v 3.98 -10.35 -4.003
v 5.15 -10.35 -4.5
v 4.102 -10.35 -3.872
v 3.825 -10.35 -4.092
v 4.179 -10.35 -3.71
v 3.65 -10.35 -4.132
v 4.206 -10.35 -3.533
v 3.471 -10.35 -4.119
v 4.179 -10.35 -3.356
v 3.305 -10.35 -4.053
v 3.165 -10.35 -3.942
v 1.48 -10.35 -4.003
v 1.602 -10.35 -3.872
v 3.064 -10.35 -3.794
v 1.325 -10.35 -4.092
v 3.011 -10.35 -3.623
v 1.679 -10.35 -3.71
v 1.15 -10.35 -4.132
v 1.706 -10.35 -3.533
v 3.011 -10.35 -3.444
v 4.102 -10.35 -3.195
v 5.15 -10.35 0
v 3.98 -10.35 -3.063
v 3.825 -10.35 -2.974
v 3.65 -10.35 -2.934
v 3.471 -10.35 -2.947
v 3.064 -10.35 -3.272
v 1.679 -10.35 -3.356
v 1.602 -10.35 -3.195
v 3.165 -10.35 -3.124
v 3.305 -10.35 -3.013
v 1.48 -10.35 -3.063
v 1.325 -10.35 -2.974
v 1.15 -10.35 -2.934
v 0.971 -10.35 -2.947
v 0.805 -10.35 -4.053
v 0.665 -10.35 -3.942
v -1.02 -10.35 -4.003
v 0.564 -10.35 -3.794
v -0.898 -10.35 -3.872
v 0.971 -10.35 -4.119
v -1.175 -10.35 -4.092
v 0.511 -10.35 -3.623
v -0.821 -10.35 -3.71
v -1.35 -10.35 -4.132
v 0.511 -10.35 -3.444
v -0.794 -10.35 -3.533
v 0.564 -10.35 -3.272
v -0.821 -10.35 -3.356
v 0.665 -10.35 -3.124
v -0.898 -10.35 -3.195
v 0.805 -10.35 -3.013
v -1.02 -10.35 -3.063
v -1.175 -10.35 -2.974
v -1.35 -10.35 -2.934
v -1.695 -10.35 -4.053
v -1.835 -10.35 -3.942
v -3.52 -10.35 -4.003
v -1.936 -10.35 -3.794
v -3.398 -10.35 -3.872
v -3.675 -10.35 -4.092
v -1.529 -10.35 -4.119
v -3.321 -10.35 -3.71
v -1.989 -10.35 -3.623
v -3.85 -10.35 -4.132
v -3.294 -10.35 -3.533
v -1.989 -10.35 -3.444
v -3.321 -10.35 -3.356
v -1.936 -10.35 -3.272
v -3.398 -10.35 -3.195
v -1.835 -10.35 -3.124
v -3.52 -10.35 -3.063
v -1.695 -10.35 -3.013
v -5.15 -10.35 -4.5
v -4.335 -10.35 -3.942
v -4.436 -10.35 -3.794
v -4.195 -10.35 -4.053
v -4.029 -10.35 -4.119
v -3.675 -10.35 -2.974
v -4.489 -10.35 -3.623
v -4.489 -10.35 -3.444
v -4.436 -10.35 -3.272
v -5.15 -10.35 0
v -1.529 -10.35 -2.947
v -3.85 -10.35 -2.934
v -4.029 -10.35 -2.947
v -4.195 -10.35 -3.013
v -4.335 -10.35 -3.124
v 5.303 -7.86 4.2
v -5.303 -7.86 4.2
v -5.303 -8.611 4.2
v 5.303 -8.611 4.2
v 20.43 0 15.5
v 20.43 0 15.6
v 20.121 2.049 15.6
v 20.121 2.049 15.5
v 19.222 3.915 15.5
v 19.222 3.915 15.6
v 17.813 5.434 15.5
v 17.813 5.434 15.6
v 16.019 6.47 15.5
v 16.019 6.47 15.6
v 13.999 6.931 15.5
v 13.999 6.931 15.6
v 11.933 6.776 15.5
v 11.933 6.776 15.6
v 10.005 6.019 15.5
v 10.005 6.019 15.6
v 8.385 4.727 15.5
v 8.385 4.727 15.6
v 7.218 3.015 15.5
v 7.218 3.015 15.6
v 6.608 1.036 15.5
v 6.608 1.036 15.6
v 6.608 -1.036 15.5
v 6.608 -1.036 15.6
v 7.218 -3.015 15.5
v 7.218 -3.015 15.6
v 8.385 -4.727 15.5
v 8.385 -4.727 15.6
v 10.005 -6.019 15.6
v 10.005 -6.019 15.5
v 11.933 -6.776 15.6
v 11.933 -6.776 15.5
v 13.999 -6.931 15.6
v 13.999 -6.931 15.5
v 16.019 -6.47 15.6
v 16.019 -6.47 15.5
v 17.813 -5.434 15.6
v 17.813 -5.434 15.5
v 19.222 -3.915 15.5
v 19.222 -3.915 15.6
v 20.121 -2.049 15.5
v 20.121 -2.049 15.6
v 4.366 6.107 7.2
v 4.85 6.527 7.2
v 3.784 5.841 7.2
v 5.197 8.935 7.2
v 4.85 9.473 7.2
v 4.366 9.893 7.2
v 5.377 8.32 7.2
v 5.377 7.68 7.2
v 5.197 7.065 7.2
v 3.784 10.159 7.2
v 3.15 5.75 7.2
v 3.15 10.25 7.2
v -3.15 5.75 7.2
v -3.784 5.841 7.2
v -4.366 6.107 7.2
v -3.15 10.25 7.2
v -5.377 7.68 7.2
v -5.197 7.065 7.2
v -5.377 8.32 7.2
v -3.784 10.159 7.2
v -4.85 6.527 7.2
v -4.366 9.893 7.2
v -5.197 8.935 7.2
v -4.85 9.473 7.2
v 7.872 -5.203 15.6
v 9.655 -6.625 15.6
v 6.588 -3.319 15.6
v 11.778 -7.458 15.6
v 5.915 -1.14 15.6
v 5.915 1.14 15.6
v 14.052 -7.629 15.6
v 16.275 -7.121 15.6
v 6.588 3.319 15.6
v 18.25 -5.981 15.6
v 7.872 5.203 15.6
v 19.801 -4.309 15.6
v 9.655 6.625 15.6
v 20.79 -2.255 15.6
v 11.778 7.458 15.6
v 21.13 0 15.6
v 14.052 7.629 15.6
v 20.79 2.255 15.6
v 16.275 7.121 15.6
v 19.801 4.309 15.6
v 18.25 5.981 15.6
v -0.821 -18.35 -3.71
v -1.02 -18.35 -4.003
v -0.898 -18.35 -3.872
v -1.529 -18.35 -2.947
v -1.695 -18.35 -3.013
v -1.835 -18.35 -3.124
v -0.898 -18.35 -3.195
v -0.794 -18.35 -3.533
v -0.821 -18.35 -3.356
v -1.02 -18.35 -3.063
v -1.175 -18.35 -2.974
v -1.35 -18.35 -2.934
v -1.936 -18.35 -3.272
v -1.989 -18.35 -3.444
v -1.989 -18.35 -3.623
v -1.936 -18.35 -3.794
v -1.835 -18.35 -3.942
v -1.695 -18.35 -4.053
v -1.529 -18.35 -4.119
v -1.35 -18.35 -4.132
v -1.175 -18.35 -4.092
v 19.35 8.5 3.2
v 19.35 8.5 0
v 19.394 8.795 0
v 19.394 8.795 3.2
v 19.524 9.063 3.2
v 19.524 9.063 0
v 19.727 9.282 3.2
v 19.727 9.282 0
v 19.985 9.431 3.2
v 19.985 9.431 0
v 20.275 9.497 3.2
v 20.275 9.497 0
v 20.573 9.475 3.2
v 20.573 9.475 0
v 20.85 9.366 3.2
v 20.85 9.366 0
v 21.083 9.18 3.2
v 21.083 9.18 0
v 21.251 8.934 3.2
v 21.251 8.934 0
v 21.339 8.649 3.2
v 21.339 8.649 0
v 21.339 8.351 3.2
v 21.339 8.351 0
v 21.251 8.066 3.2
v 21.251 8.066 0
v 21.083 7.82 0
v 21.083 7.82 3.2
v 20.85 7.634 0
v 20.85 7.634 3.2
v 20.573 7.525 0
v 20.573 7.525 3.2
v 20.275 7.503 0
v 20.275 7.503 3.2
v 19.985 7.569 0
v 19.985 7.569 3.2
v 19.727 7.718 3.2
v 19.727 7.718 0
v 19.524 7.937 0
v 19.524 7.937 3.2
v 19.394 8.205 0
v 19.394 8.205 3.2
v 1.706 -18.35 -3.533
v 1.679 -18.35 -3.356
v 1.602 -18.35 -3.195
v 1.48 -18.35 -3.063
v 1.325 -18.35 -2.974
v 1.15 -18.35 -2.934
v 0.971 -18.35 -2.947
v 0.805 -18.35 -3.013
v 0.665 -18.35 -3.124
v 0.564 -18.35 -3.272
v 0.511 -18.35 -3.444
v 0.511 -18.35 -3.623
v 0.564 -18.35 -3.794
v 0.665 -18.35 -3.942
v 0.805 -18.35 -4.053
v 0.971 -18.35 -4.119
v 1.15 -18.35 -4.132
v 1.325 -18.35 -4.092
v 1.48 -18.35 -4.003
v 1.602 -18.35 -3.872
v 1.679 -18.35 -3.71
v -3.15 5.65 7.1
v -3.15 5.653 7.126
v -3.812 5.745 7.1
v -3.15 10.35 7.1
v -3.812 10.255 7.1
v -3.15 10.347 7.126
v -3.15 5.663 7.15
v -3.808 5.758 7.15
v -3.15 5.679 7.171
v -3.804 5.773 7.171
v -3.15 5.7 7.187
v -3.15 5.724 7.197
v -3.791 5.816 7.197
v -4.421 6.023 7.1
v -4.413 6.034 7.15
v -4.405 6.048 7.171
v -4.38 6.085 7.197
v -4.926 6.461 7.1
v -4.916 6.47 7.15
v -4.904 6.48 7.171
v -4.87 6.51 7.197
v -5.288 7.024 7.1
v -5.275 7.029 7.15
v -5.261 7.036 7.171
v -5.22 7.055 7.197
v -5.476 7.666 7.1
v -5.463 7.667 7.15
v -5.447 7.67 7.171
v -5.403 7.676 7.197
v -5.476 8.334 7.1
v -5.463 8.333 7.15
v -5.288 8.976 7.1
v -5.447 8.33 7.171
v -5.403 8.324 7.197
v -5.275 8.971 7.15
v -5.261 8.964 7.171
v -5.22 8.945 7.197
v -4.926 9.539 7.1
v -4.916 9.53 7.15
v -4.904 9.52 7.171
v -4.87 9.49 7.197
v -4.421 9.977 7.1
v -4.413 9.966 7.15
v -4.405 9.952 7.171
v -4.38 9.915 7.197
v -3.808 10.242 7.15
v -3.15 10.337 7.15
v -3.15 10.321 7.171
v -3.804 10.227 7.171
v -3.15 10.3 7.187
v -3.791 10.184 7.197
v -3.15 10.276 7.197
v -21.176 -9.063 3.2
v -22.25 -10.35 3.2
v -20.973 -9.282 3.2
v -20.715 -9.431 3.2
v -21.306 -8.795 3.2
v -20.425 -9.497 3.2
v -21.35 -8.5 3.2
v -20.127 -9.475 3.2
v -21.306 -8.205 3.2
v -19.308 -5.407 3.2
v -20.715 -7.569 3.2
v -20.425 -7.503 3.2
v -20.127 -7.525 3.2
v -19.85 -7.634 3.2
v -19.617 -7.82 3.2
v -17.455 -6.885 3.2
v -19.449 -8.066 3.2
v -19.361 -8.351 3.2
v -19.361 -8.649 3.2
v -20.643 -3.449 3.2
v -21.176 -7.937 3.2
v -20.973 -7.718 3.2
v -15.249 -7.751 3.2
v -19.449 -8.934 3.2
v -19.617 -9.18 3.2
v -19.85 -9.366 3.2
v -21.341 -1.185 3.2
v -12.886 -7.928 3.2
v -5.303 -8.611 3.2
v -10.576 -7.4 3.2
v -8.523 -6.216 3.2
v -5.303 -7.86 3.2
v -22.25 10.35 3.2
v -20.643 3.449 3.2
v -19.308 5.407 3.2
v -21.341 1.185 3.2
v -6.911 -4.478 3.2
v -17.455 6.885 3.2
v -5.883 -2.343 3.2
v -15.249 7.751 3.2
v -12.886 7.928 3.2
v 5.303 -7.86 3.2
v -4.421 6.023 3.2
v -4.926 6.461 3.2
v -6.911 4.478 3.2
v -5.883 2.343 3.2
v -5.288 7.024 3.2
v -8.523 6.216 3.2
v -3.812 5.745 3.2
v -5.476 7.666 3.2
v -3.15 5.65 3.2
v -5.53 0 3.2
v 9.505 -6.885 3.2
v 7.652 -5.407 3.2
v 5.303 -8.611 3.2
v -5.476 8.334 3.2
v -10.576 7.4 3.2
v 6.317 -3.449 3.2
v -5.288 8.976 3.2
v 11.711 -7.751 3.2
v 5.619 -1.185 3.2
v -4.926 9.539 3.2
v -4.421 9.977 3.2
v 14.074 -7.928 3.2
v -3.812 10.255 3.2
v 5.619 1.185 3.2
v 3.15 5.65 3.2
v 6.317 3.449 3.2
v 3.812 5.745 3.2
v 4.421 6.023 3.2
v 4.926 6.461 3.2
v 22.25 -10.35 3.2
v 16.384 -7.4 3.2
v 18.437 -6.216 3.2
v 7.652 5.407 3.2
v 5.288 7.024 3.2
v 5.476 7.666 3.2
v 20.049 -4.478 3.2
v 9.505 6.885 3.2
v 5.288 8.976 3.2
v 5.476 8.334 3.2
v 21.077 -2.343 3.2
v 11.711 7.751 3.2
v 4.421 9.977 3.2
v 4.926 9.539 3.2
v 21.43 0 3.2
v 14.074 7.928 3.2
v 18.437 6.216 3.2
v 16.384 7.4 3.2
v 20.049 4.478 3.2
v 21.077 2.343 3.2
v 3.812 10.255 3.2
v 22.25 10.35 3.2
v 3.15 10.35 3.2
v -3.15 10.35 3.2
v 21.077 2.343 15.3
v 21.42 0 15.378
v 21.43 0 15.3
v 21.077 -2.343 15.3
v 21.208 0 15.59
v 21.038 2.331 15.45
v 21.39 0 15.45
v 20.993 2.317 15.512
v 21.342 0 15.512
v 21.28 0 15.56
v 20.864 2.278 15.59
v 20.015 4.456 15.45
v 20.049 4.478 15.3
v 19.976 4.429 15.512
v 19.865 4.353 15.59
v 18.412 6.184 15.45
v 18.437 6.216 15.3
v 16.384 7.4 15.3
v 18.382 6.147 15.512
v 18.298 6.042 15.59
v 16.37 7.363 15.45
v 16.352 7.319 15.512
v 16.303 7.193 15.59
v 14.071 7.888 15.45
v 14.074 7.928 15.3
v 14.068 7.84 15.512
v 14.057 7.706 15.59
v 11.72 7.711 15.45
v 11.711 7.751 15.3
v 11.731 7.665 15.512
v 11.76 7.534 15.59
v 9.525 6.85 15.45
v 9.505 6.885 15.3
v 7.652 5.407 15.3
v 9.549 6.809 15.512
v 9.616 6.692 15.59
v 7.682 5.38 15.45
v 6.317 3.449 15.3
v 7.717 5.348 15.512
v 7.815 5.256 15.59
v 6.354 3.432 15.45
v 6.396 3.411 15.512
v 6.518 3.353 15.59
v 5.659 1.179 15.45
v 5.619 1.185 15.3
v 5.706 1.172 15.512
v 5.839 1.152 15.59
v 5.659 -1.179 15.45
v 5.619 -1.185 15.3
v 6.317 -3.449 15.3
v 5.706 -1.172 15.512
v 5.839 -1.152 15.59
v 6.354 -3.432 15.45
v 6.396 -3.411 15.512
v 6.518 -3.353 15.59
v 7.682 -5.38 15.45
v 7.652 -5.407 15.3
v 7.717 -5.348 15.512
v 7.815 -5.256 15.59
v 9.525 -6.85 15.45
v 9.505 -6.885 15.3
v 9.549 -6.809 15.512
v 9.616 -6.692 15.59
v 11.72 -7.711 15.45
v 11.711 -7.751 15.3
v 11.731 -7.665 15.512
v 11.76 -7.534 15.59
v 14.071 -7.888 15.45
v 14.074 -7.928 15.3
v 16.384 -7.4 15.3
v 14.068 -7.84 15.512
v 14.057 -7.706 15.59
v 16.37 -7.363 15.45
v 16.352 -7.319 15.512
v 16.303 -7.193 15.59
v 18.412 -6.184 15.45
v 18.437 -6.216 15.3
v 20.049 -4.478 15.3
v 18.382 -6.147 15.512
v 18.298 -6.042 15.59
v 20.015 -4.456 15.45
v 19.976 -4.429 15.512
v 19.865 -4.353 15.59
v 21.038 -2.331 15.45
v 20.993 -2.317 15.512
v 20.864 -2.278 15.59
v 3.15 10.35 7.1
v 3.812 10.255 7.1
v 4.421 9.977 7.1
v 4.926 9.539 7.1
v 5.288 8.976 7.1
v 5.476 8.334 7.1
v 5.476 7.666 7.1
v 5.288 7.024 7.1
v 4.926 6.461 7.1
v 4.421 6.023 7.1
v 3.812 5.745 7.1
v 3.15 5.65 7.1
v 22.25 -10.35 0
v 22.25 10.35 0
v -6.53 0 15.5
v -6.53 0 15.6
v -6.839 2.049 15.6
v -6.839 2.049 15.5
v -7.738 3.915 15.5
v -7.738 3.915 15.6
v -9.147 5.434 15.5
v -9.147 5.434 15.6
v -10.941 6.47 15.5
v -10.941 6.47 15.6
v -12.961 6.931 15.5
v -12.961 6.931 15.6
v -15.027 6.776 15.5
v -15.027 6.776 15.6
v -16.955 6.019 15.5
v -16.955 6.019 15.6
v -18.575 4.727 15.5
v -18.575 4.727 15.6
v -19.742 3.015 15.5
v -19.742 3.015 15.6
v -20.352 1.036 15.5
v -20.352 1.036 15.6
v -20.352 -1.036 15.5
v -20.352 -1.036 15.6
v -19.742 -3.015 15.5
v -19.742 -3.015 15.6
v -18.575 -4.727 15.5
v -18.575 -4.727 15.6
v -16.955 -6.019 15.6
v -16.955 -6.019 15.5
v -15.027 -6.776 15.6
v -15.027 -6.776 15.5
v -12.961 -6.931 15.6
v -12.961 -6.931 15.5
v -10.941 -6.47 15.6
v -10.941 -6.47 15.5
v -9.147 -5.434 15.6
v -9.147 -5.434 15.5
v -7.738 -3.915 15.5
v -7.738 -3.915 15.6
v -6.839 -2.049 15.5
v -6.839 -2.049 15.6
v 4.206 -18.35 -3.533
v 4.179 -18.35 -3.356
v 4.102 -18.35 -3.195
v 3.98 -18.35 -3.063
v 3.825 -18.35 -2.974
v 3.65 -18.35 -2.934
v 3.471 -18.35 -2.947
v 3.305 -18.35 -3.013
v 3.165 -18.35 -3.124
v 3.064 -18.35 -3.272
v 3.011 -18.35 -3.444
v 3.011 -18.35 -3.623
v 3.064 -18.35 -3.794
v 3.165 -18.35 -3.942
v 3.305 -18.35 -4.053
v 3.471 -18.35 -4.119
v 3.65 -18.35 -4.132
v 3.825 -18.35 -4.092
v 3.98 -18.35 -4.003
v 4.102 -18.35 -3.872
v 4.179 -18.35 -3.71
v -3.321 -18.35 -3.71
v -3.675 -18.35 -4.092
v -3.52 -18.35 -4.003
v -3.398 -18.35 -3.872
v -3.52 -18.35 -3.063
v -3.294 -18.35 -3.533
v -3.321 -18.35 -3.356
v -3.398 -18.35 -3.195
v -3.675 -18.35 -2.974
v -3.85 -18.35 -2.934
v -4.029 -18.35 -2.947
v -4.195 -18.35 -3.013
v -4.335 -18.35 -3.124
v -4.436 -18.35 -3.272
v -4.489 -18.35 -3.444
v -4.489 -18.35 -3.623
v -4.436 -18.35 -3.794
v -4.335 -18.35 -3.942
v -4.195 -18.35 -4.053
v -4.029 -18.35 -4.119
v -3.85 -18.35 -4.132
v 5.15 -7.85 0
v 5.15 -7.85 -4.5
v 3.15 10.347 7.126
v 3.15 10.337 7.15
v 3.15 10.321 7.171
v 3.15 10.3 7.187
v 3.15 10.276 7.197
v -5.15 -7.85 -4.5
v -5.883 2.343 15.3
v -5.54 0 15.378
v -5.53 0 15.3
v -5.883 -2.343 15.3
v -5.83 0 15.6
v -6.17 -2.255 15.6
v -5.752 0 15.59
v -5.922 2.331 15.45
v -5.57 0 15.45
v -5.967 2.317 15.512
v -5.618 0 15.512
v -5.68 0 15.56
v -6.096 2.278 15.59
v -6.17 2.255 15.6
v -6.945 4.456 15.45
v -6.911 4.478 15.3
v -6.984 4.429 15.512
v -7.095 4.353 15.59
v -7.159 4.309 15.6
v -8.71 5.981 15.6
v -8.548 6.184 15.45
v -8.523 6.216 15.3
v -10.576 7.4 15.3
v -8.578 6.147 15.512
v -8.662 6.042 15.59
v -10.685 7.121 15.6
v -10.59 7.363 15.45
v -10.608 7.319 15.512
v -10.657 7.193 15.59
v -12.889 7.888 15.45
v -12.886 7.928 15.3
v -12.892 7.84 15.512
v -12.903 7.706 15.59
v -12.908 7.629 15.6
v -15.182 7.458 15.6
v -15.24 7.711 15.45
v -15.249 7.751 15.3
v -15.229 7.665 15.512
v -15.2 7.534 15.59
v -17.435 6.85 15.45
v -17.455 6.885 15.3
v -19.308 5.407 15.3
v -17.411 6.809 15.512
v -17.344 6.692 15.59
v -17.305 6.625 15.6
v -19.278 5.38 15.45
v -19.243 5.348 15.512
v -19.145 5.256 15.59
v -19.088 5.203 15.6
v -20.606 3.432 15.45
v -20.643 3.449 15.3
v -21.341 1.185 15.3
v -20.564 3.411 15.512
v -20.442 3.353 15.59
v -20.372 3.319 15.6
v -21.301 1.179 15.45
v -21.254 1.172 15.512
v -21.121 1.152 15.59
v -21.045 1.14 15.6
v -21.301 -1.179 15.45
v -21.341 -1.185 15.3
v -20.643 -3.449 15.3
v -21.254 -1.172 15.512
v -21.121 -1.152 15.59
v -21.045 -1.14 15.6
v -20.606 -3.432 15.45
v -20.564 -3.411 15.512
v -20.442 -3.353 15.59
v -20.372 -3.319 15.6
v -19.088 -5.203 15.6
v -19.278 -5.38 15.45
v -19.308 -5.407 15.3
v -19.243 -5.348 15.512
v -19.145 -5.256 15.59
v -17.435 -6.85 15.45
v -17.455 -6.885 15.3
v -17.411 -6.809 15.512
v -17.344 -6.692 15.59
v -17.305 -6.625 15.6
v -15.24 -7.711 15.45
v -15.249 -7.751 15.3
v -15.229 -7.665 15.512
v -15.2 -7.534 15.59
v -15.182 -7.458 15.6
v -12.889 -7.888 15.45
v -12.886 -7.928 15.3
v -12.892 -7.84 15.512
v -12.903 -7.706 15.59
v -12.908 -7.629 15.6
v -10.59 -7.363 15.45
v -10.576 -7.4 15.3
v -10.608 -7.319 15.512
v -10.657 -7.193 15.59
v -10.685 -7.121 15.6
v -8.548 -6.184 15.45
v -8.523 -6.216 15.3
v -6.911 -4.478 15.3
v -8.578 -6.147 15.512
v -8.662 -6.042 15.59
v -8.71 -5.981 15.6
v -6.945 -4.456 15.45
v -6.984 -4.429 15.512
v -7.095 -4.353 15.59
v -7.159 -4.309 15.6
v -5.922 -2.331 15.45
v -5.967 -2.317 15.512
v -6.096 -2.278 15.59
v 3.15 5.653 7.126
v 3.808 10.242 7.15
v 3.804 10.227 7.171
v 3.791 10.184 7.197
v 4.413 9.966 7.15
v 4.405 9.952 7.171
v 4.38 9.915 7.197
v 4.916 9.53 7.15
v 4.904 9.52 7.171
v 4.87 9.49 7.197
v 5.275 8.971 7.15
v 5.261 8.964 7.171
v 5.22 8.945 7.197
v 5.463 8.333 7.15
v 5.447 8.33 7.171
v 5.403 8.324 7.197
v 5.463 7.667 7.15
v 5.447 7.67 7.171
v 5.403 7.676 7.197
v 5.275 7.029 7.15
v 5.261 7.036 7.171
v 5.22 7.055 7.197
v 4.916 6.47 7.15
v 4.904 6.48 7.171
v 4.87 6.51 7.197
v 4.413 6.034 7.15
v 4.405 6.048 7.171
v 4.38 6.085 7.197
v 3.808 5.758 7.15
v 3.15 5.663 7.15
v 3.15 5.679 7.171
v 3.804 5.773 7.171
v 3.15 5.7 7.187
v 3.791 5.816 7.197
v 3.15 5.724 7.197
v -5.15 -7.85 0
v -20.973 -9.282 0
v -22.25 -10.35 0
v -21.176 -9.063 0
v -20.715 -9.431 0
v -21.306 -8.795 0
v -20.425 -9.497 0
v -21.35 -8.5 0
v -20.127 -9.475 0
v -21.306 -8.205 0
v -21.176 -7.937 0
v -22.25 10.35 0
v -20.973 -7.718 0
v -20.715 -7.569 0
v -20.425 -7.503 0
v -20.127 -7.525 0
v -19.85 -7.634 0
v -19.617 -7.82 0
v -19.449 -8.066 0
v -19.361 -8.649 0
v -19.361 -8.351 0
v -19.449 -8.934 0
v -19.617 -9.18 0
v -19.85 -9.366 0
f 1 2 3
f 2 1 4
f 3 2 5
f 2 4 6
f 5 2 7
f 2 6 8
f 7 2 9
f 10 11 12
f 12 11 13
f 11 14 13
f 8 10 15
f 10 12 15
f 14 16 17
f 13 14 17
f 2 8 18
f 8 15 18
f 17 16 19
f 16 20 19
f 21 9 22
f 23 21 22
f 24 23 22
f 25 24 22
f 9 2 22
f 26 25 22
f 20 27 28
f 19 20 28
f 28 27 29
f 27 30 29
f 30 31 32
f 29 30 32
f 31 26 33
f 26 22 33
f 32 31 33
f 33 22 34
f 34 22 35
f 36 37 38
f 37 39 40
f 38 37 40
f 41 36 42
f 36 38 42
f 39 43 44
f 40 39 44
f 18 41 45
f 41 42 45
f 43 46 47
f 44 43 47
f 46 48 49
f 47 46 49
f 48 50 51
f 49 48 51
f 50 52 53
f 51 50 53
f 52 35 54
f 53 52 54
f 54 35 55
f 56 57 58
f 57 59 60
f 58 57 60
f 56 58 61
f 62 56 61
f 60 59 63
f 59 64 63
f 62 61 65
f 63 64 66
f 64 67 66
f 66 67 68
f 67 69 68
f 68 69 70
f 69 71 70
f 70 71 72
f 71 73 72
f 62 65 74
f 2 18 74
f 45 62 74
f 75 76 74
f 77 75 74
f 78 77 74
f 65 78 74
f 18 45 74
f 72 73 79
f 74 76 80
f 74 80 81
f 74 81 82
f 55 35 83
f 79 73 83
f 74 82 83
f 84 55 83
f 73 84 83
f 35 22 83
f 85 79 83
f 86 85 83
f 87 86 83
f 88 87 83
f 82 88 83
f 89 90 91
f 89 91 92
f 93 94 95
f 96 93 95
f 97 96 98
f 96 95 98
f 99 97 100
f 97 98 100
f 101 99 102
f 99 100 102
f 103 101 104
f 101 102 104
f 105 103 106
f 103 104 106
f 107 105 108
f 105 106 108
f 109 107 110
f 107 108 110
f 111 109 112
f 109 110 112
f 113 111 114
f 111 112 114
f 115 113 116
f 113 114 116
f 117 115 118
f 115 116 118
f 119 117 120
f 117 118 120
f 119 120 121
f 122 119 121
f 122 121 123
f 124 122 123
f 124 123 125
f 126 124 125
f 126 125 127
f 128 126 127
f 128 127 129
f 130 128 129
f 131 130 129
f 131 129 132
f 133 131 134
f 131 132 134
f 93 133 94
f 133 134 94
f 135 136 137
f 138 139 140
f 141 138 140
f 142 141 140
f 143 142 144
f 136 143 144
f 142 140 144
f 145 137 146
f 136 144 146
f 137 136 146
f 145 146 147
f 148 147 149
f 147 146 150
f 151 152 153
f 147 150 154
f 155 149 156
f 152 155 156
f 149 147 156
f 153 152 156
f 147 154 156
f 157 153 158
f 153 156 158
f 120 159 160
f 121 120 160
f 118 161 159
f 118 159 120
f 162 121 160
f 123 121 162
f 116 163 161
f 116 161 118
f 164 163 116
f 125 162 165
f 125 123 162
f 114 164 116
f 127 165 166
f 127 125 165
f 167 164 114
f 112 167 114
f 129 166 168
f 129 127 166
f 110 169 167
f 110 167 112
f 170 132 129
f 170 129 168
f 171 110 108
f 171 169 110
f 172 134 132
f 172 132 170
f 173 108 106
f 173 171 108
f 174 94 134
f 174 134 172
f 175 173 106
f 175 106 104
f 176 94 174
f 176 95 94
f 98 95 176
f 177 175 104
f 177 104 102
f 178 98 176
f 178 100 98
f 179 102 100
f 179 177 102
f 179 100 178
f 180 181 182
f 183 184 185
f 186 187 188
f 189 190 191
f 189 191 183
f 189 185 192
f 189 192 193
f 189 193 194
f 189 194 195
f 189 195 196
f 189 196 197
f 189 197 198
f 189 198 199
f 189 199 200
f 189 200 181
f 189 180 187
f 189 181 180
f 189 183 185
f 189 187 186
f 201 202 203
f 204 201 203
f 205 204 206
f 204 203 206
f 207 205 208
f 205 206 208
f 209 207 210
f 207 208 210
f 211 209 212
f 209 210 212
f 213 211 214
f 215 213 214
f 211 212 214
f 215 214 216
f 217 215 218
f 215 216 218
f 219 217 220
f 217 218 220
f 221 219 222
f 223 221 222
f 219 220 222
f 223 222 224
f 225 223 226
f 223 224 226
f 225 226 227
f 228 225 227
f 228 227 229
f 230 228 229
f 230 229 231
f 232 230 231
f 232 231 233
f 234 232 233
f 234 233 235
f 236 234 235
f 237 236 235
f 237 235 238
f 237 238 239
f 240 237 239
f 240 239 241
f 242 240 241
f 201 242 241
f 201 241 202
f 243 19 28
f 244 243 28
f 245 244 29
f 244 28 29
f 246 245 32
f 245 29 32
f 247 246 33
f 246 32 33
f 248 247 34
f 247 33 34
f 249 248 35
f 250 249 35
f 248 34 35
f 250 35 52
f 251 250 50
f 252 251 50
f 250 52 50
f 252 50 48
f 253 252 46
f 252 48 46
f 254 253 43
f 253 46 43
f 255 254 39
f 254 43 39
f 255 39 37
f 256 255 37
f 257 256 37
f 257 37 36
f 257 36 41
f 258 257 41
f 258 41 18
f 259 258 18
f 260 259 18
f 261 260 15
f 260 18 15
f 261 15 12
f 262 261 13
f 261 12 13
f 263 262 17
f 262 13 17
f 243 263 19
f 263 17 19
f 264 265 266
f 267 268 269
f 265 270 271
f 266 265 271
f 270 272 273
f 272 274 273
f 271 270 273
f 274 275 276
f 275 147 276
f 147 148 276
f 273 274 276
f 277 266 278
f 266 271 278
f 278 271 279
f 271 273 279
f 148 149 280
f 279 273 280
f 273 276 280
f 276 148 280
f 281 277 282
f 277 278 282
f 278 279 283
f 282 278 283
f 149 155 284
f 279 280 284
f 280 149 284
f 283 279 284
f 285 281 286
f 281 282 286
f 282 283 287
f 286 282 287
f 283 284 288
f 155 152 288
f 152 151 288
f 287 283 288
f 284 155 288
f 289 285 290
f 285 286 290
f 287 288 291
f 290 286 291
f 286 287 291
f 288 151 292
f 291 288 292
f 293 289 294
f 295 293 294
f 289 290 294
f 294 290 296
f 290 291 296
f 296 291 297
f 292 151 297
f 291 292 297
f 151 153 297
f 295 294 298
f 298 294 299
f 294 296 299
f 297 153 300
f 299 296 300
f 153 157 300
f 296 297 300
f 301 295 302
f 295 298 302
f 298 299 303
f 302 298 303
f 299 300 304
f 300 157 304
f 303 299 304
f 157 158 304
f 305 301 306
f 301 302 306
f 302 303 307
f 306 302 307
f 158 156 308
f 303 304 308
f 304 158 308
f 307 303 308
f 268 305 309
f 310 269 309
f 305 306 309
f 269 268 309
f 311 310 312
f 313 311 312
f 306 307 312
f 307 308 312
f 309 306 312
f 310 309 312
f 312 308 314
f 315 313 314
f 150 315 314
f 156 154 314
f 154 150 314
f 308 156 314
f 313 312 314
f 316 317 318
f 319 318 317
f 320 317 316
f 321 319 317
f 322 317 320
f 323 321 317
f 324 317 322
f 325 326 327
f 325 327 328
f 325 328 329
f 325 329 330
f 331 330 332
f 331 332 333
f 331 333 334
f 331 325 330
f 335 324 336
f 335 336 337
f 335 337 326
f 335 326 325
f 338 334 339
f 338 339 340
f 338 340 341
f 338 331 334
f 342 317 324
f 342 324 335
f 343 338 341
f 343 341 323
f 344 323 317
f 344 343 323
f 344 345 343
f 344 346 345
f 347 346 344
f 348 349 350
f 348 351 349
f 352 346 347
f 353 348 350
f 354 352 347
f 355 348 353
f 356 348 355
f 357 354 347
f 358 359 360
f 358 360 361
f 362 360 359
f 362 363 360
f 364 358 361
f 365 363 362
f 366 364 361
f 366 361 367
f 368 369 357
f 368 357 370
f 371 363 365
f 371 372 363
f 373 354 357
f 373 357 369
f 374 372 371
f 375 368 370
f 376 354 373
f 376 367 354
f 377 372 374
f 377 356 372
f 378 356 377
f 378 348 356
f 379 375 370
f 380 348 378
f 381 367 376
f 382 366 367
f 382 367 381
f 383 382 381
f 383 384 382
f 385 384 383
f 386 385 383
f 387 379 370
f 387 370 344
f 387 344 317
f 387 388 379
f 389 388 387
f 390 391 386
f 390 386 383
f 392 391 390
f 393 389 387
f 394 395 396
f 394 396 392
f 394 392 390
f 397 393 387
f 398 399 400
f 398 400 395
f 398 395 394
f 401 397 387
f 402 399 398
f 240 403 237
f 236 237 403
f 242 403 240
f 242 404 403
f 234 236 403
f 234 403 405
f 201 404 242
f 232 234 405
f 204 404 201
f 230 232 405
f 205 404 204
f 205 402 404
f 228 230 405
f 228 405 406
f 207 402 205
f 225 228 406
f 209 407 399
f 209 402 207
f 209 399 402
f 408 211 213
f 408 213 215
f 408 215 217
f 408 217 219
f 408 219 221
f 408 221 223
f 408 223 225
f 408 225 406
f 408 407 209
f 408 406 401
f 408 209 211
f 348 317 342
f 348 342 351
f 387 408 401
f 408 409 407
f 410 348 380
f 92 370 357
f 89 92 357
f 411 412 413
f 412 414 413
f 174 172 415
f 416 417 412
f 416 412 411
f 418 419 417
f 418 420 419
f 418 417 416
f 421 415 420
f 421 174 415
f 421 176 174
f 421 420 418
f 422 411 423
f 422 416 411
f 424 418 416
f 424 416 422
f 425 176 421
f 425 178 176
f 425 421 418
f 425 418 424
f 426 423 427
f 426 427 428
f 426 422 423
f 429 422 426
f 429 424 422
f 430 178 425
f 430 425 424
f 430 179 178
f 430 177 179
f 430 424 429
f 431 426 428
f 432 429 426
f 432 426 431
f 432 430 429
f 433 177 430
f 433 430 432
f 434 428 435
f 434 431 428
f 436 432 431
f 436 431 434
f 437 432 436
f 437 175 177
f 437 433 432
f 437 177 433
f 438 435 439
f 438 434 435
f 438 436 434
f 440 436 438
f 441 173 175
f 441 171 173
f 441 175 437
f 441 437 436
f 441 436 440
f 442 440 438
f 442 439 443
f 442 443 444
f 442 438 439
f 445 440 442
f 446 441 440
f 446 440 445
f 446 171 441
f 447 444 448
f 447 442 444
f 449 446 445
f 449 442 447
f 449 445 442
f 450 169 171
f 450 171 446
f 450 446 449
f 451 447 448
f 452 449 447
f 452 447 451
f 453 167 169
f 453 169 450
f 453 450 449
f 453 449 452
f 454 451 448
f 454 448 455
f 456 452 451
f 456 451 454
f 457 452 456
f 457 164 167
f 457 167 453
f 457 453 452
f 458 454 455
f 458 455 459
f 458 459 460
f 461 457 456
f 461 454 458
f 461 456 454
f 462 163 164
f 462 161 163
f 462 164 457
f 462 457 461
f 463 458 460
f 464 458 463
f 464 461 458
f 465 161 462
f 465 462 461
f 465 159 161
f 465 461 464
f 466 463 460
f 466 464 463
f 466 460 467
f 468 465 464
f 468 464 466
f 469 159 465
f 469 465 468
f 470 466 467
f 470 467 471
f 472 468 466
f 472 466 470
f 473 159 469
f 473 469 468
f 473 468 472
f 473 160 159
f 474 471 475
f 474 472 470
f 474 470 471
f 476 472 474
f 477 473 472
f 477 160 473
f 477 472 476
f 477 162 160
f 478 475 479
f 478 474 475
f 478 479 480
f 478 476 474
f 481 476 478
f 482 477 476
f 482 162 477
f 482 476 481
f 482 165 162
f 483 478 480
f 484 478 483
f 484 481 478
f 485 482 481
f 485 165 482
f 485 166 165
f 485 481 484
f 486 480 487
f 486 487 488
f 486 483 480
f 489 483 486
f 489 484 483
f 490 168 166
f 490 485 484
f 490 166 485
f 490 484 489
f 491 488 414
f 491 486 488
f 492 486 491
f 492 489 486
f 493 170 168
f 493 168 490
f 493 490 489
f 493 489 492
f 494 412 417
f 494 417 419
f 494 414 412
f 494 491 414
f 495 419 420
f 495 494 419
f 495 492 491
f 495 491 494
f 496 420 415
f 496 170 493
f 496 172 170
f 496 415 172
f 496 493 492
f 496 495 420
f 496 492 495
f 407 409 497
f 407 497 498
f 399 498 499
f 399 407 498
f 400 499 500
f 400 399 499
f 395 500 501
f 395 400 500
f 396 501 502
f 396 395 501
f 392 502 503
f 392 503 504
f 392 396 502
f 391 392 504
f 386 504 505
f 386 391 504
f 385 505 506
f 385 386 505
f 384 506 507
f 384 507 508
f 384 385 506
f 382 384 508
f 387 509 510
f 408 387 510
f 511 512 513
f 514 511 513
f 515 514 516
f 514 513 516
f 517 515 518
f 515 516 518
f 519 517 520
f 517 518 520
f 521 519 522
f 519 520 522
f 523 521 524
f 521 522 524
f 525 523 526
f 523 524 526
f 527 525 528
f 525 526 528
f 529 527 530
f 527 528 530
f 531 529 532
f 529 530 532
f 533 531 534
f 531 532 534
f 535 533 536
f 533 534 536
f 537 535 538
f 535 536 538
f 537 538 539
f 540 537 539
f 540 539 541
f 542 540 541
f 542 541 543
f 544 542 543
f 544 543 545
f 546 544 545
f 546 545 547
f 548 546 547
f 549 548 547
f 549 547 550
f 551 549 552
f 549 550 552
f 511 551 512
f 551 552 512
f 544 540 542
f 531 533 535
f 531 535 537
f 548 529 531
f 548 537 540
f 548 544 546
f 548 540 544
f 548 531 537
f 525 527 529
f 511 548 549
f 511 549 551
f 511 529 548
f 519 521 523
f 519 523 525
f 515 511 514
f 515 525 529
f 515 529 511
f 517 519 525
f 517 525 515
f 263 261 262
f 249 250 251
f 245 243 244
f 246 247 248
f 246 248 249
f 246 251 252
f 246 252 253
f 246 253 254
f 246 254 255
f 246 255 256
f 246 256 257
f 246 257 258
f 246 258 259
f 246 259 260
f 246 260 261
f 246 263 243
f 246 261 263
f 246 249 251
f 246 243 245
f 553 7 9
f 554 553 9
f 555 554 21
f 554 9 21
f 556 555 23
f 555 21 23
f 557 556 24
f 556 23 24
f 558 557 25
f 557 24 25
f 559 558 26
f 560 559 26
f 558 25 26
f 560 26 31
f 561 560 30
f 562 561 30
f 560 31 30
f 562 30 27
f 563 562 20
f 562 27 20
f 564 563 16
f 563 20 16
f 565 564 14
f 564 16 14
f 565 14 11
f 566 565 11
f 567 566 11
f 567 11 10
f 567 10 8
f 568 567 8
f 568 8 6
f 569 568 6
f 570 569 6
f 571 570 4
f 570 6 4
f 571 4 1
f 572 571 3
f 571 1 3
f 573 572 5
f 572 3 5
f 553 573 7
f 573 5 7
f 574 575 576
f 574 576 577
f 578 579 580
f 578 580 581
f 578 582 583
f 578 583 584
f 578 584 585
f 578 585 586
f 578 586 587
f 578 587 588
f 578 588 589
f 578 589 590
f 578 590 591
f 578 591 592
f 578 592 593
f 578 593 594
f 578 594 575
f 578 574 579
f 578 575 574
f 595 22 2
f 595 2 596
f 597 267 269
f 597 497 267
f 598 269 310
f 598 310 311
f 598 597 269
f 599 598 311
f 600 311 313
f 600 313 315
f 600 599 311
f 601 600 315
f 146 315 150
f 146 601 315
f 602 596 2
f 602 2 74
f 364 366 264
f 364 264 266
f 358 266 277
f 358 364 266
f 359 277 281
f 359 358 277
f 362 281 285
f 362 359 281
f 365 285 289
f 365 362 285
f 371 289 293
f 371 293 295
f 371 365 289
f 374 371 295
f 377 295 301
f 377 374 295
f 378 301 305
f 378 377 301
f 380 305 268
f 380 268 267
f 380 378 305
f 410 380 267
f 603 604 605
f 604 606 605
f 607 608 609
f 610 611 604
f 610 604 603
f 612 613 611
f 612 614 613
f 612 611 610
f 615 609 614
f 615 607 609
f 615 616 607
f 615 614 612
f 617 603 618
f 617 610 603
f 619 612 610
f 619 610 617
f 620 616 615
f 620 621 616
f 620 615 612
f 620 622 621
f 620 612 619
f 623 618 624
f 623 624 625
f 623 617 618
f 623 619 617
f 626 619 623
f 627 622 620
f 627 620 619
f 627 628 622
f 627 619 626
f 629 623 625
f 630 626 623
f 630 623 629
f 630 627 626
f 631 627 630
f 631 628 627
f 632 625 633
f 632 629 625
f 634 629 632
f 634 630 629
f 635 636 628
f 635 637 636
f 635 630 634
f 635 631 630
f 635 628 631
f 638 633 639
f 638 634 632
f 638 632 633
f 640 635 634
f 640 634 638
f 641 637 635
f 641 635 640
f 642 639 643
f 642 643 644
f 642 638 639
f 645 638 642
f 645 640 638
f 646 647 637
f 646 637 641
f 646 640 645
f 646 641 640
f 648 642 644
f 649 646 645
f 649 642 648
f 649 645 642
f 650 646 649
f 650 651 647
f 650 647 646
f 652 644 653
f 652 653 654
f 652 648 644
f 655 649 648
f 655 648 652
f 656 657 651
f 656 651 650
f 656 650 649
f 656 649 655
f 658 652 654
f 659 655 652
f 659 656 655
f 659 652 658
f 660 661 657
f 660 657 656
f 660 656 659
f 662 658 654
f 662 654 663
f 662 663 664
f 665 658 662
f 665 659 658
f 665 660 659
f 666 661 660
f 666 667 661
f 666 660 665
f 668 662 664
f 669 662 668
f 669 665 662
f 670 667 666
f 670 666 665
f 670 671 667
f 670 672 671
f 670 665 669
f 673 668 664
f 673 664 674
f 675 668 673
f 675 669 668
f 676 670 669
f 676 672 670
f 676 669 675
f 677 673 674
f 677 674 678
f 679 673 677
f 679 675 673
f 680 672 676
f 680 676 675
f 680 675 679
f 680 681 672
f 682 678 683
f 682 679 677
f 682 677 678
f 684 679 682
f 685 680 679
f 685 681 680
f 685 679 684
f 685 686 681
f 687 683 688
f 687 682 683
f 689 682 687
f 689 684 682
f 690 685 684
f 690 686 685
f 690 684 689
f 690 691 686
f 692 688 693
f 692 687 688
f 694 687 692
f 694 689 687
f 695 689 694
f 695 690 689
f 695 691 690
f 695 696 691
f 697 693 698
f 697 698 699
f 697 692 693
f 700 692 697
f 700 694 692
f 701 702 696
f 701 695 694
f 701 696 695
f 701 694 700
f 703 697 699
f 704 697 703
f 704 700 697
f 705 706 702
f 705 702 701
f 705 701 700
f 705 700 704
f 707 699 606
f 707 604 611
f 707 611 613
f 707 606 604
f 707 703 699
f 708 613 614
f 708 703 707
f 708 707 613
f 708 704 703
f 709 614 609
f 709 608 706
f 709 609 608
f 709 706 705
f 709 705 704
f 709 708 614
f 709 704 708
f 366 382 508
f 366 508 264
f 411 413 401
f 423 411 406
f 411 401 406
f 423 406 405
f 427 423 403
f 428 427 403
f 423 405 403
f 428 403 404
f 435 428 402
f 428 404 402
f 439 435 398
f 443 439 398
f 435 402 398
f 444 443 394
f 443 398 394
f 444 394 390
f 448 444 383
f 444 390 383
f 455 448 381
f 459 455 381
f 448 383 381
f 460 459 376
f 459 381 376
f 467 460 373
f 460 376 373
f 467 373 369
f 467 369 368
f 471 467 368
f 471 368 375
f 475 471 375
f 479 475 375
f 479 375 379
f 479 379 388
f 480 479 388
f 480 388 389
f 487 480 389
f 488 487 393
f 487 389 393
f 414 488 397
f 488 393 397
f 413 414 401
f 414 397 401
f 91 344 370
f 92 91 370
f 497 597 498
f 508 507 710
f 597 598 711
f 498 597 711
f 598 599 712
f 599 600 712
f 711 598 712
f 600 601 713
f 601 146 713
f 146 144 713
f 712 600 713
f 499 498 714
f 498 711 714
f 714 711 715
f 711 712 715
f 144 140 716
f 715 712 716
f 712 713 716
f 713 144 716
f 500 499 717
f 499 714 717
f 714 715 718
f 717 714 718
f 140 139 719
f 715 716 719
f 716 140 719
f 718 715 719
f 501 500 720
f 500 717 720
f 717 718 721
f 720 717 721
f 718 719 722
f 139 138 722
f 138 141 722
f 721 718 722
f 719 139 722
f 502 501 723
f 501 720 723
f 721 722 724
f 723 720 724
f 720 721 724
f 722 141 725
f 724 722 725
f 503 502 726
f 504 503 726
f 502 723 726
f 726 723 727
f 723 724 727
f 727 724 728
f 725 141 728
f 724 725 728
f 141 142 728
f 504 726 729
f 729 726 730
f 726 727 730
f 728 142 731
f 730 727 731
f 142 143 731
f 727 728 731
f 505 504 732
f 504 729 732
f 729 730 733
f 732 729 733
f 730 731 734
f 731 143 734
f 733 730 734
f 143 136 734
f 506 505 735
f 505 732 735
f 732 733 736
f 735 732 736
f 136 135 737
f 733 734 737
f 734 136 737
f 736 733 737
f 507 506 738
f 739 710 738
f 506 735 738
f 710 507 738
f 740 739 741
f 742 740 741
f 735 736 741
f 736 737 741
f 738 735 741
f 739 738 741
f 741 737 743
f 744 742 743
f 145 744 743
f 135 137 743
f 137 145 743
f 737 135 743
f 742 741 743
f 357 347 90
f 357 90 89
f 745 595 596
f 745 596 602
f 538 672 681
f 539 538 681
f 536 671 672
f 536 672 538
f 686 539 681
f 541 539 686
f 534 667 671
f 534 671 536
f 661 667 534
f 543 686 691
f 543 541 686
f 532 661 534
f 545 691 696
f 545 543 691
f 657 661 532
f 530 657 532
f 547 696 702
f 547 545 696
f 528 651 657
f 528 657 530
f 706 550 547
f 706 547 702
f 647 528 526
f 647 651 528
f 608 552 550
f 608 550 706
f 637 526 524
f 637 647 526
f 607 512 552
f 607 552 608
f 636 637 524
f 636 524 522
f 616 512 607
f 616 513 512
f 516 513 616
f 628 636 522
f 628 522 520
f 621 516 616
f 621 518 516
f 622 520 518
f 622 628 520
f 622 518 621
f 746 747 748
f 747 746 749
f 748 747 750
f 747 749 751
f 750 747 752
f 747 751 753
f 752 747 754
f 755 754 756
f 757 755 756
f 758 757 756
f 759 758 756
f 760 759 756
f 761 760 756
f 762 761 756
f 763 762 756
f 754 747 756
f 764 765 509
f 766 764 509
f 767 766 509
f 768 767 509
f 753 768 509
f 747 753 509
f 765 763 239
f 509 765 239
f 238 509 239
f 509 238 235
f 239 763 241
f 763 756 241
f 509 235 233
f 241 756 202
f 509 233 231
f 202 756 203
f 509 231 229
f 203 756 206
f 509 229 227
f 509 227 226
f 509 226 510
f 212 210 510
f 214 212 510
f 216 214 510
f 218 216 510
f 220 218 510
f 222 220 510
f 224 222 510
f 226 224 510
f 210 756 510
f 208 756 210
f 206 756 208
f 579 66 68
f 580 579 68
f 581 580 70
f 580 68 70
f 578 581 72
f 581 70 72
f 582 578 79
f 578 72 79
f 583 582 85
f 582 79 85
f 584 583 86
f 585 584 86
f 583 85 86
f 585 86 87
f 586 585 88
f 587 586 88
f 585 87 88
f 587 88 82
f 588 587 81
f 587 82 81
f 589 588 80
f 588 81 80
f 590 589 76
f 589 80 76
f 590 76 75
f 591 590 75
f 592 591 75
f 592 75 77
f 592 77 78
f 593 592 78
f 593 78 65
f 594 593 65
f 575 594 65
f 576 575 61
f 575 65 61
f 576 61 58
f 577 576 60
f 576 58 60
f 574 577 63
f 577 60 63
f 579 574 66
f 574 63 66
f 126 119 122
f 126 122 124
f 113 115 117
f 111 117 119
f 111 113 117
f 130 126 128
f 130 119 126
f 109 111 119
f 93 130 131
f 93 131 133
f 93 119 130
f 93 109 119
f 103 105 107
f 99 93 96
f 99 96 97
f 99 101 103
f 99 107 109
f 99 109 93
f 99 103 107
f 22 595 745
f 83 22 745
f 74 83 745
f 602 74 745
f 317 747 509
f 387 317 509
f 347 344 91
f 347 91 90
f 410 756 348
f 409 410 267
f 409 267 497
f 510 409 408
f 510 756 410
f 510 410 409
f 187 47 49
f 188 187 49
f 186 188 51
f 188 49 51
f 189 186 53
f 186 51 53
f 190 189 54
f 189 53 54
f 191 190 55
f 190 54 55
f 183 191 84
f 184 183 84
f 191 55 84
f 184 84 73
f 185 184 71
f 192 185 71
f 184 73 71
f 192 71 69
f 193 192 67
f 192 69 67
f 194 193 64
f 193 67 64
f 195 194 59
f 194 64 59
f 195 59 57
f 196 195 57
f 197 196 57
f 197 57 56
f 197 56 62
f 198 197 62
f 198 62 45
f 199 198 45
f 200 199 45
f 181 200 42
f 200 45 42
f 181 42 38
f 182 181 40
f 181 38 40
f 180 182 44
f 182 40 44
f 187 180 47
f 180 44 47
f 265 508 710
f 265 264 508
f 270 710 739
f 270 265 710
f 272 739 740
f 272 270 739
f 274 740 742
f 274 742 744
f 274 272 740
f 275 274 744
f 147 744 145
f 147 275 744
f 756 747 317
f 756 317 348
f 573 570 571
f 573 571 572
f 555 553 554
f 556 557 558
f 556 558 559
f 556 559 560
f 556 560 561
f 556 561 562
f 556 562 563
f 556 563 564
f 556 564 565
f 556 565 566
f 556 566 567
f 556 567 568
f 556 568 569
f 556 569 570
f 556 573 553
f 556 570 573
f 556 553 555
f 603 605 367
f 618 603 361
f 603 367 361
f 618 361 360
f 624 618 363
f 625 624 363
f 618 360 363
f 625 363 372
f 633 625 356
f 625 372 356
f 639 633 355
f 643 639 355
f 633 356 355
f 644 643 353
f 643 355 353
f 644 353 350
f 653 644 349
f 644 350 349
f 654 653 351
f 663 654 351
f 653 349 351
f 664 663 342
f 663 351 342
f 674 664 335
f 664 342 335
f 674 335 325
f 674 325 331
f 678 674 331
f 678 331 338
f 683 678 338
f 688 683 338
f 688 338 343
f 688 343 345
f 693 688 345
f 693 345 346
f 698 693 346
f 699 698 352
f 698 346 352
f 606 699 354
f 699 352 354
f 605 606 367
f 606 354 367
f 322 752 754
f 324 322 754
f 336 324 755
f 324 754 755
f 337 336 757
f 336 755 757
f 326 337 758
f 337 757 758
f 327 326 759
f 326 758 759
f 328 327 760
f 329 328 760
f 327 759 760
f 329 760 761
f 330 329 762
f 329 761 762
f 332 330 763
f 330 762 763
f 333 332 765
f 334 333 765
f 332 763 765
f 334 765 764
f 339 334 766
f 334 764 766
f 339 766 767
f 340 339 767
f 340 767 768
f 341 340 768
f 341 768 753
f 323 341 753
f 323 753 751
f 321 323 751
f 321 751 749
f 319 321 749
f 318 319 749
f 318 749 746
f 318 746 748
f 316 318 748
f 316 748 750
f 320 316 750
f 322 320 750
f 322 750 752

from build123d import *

# Parameters (mm, degrees)
SKETCH_1_W          = 44.5
SKETCH_1_H          = 20.7
EXTRUDE_1_DEPTH     = 3.2
EXTRUDE_2_DEPTH     = 4
FILLET_1_R          = 0.1
SKETCH_3_R          = 7.95
EXTRUDE_3_DEPTH     = 12.4
SKETCH_4_R          = 6.95
CUT_EXTRUDE_1_DEPTH = 0.1
FILLET_2_R          = 0.3
SKETCH_5_W          = 10.605065306
SKETCH_5_H          = 0.750801084
EXTRUDE_4_DEPTH     = 1
SKETCH_6_W          = 10.3
SKETCH_6_H          = 2.5
EXTRUDE_5_DEPTH     = 4.5
SKETCH_7_R          = 0.600934077
EXTRUDE_6_DEPTH     = 8
SKETCH_8_R          = 1
CUT_EXTRUDE_2_DEPTH = 10


with BuildPart() as part:
    # Эскиз1 → Бобышка-Вытянуть1 (new body)
    with BuildSketch(Plane.XY):
        Rectangle(SKETCH_1_W, SKETCH_1_H)
    extrude(amount=EXTRUDE_1_DEPTH)

    # Эскиз2 → Бобышка-Вытянуть2 (add)
    with BuildSketch(Plane.XY.offset(3.2)):
        with BuildLine():
            Line((-3.15, 10.35), (3.15, 10.35))
            ThreePointArc((3.15, 10.35), (5.5, 8), (3.15, 5.65))
            Line((3.15, 5.65), (-3.15, 5.65))
            ThreePointArc((-3.15, 5.65), (-5.5, 8), (-3.15, 10.35))
        make_face()
    extrude(amount=EXTRUDE_2_DEPTH)

    # Скругление1
    fillet_1_edges = [part.edges().sort_by_distance(p)[0] for p in [
        (-5.5, 8, 7.2),
        (0, 5.65, 7.2),
        (5.5, 8, 7.2),
        (0, 10.35, 7.2),
    ]]
    fillet(fillet_1_edges, radius=FILLET_1_R)

    # Эскиз3 → Бобышка-Вытянуть3 (add)
    with BuildSketch(Plane.XY.offset(3.2)):
        with Locations((-13.48, 0)):
            Circle(SKETCH_3_R)
        with Locations((13.48, 0)):
            Circle(SKETCH_3_R)
    extrude(amount=EXTRUDE_3_DEPTH)

    # Эскиз4 → Вырез-Вытянуть1 (cut)
    with BuildSketch(Plane.XY.offset(15.6)):
        with Locations((-13.48, 0)):
            Circle(SKETCH_4_R)
        with Locations((13.48, 0)):
            Circle(SKETCH_4_R)
    extrude(amount=-CUT_EXTRUDE_1_DEPTH, mode=Mode.SUBTRACT)

    # Скругление2
    fillet_2_edges = [part.edges().sort_by_distance(p)[0] for p in [
        (-21.43, 0, 15.6),
        (5.53, 0, 15.6),
    ]]
    fillet(fillet_2_edges, radius=FILLET_2_R)

    # Эскиз5 → Бобышка-Вытянуть4 (add)
    with BuildSketch(Plane.XY.offset(3.2)):
        with Locations((0, -8.235349386)):
            Rectangle(SKETCH_5_W, SKETCH_5_H)
    extrude(amount=EXTRUDE_4_DEPTH)

    # Эскиз8 → Вырез-Вытянуть2 (cut)
    with BuildSketch(Plane(origin=(0, 0, 0), x_dir=(-1, 0, 0), z_dir=(0, 0, -1))):
        with Locations((-20.35, 8.5)):
            Circle(SKETCH_8_R)
        with Locations((20.35, -8.5)):
            Circle(SKETCH_8_R)
    extrude(amount=-CUT_EXTRUDE_2_DEPTH, mode=Mode.SUBTRACT)


with BuildPart() as body_2:
    # Эскиз6 → Бобышка-Вытянуть5 (new body)
    with BuildSketch(Plane(origin=(0, 0, 0), x_dir=(-1, 0, 0), z_dir=(0, 0, -1))):
        with Locations((0, -9.1)):
            Rectangle(SKETCH_6_W, SKETCH_6_H)
    extrude(amount=EXTRUDE_5_DEPTH)

    # Эскиз7 → Бобышка-Вытянуть6 (add)
    with BuildSketch(Plane.XZ.offset(10.35)):
        with Locations((-3.894780621, -3.533075537)):
            Circle(SKETCH_7_R)
        with Locations((-1.394780621, -3.533075537)):
            Circle(SKETCH_7_R)
        with Locations((1.105219379, -3.533075537)):
            Circle(SKETCH_7_R)
        with Locations((3.605219379, -3.533075537)):
            Circle(SKETCH_7_R)
    extrude(amount=EXTRUDE_6_DEPTH)


solid = Compound([part.part, body_2.part])
